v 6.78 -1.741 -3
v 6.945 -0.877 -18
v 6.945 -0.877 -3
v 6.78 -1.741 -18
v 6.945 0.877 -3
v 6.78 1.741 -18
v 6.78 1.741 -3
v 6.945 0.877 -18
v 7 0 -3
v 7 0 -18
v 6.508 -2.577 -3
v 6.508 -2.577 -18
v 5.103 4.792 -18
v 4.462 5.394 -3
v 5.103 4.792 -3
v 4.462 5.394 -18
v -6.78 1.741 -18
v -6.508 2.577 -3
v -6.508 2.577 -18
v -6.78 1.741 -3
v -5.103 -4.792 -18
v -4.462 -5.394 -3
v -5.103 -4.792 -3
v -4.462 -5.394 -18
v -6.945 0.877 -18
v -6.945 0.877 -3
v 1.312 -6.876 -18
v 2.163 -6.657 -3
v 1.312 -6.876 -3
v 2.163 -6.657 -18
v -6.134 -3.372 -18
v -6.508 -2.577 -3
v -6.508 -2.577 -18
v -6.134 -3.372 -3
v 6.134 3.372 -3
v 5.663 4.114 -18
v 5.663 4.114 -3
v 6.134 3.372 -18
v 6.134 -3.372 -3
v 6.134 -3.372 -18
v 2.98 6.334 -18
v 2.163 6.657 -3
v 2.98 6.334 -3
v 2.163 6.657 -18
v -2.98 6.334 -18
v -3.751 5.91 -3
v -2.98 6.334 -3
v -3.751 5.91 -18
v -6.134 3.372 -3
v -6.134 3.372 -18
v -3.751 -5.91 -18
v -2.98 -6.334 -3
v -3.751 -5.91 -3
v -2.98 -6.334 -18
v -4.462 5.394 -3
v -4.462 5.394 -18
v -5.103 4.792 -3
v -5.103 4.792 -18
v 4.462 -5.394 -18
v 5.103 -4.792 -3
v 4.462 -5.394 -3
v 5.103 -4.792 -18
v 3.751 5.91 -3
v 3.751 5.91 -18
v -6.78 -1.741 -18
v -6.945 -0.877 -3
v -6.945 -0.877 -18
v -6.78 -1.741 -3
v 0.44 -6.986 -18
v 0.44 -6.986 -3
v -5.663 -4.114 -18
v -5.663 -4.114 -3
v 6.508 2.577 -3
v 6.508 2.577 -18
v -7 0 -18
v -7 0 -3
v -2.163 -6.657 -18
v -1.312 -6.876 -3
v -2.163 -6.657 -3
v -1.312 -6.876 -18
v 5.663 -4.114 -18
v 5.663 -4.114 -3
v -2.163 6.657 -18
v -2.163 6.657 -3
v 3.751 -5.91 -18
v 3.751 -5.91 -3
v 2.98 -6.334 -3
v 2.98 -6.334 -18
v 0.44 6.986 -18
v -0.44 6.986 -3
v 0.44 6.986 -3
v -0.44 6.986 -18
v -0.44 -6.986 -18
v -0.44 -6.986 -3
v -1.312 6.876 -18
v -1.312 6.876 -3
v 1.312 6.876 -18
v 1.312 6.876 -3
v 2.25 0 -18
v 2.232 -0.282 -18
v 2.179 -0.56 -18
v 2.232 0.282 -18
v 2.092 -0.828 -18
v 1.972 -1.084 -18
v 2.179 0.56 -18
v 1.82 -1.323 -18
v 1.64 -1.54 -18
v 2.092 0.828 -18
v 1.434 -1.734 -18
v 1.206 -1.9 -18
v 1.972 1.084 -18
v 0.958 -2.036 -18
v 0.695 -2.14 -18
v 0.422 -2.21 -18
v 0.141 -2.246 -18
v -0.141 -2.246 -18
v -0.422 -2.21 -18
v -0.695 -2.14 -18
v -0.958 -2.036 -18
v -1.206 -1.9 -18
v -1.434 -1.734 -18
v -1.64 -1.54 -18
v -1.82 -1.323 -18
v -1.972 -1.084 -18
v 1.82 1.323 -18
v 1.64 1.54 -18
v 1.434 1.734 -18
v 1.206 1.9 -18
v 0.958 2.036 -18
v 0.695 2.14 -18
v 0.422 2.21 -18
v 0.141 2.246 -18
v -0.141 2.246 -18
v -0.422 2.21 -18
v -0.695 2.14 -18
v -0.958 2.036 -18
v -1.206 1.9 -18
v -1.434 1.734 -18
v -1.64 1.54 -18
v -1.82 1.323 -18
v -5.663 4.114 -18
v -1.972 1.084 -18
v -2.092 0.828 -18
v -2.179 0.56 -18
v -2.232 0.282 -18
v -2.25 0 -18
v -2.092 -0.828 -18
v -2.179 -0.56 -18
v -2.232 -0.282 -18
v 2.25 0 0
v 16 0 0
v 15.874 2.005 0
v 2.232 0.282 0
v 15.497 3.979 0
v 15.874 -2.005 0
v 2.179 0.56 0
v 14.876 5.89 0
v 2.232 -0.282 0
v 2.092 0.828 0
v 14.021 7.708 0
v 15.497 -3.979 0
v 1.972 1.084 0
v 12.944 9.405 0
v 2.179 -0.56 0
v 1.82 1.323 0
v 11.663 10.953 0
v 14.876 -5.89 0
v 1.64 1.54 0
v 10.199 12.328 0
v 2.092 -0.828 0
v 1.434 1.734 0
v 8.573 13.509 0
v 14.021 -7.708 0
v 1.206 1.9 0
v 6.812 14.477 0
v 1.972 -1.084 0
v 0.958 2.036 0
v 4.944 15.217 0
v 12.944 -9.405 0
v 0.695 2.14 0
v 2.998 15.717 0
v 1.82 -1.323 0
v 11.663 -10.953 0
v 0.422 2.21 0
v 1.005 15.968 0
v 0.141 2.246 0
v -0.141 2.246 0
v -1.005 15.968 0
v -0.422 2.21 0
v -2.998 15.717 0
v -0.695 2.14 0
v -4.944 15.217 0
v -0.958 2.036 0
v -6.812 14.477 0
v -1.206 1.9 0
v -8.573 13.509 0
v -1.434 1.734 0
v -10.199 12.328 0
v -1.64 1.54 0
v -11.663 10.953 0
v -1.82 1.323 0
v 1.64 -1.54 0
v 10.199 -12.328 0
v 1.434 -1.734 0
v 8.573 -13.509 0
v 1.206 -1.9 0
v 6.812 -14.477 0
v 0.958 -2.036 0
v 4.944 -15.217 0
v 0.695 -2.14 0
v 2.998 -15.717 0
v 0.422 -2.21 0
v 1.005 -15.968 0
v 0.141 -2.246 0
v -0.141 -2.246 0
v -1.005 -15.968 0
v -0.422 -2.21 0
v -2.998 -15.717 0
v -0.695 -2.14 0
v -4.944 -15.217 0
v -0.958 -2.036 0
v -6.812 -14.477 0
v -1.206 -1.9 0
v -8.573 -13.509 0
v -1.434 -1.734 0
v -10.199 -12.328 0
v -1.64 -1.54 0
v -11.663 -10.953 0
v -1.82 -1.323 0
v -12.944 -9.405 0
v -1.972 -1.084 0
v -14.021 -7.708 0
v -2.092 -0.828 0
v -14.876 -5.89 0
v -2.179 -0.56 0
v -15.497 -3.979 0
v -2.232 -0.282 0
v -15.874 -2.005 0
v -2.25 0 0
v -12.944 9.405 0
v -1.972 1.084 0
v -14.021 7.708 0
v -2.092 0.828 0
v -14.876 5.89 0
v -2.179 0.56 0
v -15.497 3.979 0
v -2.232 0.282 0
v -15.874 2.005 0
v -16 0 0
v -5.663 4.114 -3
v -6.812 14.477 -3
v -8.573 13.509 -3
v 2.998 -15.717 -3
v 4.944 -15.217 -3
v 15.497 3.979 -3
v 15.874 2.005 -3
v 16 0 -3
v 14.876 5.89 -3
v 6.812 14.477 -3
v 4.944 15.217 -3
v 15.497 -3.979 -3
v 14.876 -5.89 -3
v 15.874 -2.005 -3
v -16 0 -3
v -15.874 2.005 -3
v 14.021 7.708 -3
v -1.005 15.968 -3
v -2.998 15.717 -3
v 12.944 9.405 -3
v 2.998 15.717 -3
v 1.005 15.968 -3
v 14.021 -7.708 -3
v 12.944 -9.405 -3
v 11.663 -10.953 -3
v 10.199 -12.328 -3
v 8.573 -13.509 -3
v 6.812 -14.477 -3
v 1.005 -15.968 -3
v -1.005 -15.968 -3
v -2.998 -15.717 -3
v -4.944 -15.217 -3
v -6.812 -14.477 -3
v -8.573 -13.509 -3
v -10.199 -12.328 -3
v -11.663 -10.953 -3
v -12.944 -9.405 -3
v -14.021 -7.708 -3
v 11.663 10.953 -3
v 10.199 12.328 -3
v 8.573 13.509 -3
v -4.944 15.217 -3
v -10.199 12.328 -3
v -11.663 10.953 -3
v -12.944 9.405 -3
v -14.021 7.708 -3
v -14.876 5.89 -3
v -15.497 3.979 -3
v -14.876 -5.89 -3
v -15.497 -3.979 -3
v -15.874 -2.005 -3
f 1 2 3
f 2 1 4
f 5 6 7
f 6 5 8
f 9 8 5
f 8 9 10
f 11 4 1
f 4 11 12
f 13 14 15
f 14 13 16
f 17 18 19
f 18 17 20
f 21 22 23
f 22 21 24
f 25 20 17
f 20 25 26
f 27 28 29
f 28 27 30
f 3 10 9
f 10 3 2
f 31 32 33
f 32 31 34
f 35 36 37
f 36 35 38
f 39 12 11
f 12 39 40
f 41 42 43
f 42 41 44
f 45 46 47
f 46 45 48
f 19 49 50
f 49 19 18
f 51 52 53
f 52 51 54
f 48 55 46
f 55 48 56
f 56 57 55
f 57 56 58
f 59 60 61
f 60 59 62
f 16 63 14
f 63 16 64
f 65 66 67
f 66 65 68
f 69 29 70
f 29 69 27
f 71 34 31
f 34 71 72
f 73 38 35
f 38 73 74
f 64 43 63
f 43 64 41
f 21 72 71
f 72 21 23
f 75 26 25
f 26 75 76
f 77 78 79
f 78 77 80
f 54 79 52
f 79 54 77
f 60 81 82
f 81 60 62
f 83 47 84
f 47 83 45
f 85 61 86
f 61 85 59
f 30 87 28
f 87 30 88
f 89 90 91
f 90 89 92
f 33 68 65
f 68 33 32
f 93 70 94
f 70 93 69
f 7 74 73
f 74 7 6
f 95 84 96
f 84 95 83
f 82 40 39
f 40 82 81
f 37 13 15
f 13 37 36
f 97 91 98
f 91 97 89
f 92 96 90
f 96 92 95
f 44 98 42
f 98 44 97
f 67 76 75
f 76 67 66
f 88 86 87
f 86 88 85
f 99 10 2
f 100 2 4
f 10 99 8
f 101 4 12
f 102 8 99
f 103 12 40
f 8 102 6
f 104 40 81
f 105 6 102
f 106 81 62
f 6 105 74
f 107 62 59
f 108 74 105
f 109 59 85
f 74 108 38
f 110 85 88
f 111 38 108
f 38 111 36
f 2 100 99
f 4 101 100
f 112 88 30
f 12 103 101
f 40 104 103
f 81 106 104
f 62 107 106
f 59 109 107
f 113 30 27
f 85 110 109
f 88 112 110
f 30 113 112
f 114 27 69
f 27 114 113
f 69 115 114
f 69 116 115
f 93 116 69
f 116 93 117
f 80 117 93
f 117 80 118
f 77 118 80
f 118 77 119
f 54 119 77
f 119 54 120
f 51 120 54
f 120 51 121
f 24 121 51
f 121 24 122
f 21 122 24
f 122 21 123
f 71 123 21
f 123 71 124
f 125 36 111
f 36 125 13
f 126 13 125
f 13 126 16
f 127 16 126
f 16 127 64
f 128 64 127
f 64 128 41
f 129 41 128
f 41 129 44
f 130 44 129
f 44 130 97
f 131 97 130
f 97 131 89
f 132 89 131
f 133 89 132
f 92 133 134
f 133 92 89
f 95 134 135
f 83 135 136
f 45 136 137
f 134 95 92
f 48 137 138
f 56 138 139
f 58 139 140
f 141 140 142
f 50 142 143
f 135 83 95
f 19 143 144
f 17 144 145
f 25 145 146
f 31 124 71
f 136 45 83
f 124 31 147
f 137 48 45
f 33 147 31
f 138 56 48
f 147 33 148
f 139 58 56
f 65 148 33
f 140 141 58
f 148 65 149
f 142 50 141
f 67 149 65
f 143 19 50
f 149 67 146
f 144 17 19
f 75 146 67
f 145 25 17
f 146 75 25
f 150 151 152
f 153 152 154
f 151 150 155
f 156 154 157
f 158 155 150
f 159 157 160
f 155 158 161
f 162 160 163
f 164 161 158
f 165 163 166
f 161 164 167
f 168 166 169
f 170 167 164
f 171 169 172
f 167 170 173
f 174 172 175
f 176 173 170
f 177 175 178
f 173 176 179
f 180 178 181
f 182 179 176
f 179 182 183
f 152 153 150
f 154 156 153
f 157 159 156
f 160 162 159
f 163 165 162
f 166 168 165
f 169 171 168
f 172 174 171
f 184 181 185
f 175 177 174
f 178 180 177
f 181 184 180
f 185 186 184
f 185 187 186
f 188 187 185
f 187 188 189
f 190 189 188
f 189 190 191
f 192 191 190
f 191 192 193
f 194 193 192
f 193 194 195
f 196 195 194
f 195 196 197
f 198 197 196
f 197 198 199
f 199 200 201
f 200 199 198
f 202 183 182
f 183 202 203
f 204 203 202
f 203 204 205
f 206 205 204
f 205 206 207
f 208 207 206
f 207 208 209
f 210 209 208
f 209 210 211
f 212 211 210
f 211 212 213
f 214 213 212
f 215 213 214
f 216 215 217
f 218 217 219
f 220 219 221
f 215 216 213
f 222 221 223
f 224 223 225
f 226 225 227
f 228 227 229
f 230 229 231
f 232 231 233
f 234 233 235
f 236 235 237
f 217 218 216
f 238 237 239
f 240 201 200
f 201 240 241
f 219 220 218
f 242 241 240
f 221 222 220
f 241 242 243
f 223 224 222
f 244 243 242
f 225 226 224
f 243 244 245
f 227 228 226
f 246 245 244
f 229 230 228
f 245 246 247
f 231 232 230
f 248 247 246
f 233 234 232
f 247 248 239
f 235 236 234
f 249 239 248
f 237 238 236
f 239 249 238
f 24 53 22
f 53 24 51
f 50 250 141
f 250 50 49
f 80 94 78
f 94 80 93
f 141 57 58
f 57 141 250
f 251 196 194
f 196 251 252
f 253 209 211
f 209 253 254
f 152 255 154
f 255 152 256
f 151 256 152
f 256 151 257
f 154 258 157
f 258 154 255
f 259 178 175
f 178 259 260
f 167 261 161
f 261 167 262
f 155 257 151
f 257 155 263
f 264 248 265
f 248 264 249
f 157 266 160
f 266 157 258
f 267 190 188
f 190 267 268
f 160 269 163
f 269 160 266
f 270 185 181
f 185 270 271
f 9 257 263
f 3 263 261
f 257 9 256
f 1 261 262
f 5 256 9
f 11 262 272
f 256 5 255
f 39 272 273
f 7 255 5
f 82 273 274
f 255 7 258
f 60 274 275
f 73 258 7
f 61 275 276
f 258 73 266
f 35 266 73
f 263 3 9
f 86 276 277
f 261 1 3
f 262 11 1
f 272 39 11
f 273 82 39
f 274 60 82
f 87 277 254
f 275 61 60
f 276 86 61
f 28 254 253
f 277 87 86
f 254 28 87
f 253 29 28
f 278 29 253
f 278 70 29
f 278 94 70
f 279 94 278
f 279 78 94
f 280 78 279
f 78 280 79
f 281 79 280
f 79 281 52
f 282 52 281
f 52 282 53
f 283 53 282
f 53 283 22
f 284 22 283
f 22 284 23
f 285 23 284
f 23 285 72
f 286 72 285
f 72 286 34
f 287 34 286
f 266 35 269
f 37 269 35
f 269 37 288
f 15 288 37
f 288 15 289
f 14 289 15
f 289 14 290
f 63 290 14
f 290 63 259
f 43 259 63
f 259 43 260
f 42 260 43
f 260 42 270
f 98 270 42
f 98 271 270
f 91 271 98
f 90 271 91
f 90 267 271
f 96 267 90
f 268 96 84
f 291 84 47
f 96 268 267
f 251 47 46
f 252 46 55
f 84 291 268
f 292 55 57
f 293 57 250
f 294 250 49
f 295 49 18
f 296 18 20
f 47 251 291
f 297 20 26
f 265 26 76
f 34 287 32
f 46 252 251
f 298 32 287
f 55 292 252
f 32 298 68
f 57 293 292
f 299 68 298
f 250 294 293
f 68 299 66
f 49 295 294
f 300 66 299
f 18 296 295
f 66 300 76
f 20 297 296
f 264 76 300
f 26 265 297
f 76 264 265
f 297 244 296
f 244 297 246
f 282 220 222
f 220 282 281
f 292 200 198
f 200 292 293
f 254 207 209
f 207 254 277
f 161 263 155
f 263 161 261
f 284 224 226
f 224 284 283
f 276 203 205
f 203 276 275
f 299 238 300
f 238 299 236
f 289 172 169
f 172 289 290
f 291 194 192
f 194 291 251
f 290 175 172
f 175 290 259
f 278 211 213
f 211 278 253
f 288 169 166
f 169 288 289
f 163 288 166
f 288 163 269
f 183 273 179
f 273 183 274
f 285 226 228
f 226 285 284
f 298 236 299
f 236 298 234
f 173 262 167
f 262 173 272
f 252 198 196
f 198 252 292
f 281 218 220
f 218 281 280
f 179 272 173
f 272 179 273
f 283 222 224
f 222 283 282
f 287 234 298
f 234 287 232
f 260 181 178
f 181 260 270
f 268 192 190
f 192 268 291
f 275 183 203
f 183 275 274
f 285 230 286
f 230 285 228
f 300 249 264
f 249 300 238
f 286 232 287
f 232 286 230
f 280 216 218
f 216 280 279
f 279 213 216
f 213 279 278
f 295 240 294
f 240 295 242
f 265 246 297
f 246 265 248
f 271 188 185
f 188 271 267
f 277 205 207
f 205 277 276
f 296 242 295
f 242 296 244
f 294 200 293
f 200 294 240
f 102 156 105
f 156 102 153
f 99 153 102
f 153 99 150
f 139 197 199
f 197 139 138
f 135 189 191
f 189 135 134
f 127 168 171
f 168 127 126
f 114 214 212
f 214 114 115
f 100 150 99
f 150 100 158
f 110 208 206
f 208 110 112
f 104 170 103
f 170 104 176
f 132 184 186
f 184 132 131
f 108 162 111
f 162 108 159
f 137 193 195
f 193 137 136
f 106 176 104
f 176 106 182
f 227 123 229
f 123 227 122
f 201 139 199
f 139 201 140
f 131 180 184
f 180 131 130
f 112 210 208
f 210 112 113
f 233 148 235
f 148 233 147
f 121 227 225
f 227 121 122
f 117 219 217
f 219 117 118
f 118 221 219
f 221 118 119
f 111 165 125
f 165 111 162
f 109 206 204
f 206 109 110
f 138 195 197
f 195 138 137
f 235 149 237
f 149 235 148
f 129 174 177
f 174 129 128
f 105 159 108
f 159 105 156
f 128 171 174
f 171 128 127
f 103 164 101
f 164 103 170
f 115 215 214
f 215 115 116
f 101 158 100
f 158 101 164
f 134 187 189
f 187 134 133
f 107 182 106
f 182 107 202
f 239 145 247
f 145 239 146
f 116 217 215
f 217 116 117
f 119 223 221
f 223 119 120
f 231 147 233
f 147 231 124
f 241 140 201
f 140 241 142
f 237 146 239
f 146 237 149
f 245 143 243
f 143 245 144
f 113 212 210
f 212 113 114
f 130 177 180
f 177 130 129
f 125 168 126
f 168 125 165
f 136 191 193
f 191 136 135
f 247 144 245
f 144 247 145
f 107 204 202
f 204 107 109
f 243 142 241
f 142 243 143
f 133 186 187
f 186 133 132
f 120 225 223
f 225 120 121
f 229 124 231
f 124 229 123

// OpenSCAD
$fn = 50;


difference() {
	union() {
		translate(v = [0, 0, -18.0000000000]) {
			cylinder(h = 18, r = 7.0000000000);
		}
		translate(v = [0, 0, -3.0000000000]) {
			cylinder(h = 3, r = 16.0000000000);
		}
	}
	union() {
		#translate(v = [0, 0, -18]) {
			cylinder(h = 18, r = 2.2500000000);
		}
	}
}
